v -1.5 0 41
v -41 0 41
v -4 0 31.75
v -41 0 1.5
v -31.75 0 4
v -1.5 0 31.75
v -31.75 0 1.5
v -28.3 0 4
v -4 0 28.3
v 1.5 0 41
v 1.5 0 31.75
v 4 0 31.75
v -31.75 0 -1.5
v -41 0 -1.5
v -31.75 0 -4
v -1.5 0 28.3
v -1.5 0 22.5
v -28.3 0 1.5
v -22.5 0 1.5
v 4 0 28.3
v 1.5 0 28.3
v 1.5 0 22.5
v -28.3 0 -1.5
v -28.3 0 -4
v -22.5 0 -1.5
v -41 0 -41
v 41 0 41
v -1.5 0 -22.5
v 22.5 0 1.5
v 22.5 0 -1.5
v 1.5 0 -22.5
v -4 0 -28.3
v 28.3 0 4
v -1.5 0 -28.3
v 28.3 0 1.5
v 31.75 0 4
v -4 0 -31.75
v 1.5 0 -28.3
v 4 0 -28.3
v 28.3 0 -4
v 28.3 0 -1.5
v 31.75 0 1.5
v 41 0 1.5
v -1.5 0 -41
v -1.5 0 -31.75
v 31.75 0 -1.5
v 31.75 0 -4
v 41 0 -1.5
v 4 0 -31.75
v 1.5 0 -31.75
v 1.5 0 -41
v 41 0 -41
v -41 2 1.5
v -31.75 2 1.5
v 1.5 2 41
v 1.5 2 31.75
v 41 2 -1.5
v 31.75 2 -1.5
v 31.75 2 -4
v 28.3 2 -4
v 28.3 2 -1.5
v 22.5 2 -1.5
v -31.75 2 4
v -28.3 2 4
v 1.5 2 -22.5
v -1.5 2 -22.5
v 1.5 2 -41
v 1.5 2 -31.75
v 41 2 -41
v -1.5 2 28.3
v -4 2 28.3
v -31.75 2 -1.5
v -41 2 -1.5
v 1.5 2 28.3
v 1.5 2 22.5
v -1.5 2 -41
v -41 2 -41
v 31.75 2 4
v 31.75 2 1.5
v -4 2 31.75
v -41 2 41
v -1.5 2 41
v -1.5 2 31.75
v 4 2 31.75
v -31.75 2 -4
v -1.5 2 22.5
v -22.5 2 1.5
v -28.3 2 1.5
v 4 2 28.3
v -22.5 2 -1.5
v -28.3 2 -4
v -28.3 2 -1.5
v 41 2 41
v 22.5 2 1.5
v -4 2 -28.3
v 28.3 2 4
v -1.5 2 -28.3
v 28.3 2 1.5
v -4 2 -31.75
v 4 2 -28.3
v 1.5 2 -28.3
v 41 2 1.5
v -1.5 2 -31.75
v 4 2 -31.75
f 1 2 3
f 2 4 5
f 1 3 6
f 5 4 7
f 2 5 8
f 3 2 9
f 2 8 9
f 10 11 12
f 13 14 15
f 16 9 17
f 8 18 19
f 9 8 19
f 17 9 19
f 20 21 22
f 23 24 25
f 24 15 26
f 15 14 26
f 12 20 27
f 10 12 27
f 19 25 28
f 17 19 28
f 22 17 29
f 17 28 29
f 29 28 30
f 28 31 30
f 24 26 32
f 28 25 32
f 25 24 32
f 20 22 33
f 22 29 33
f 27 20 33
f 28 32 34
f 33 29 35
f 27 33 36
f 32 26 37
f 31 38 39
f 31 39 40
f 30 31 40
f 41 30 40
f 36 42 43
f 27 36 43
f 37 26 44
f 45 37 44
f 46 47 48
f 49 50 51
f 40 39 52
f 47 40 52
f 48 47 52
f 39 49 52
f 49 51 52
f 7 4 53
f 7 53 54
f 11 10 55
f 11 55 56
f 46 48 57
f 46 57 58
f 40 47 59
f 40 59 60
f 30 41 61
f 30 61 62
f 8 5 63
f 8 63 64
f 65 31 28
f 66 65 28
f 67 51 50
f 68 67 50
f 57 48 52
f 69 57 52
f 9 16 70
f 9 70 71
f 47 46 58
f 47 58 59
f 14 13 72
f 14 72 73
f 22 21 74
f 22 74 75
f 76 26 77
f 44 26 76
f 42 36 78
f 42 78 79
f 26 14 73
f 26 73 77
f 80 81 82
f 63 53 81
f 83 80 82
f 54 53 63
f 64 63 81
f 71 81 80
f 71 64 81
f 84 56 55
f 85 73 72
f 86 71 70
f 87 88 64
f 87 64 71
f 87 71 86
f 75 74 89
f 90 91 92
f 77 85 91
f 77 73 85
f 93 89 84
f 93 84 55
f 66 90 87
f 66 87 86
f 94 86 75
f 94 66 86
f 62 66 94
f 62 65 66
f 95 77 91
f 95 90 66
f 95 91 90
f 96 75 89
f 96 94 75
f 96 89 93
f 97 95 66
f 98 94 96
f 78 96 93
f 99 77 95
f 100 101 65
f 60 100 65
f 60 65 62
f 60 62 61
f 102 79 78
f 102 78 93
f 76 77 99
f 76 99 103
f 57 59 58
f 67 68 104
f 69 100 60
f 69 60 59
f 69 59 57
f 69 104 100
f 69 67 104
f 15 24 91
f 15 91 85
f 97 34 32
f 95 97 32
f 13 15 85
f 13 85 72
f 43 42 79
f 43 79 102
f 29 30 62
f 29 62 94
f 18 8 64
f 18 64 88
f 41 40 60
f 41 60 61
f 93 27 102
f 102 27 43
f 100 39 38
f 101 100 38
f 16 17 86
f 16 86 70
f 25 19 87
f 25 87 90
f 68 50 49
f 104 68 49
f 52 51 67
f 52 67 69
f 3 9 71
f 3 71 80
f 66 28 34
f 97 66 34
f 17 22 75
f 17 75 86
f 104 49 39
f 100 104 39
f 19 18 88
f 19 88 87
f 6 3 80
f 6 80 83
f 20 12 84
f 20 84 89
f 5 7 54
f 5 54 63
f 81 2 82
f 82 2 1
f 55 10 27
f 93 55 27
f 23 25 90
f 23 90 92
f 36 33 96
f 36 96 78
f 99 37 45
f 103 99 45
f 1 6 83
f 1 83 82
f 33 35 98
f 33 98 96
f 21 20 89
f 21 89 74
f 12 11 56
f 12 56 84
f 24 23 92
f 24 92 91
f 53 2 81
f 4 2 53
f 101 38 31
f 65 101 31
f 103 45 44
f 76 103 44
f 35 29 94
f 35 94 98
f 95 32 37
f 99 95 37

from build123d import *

# Parameters (mm, degrees)
SKETCH1_W           = 82
SKETCH1_H           = 82
BOSS_EXTRUDE1_DEPTH = 2
CUT_EXTRUDE2_DEPTH  = 10


with BuildPart() as part:
    # Sketch1 → Boss-Extrude1 (new body)
    with BuildSketch(Plane(origin=(0, 0, 0), x_dir=(1, 0, 0), z_dir=(0, 1, 0))):
        Rectangle(SKETCH1_W, SKETCH1_H)
    extrude(amount=BOSS_EXTRUDE1_DEPTH)

    # Sketch2 → Cut-Extrude2 (cut)
    with BuildSketch(Plane(origin=(0, 0, 0), x_dir=(-1, 0, 0), z_dir=(0, -1, 0))):
        Polygon((-1.5, 22.5), (1.5, 22.5), (1.5, 28.3), (4, 28.3), (4, 31.75), (1.5, 31.75), (1.5, 41), (-1.5, 41), (-1.5, 31.75), (-4, 31.75), (-4, 28.3), (-1.5, 28.3), align=None)
        Polygon((28.3, -4), (28.3, -1.5), (22.5, -1.5), (22.5, 1.5), (28.3, 1.5), (28.3, 4), (31.75, 4), (31.75, 1.5), (41, 1.5), (41, -1.5), (31.75, -1.5), (31.75, -4), align=None)
        Polygon((-4, -28.3), (-1.5, -28.3), (-1.5, -22.5), (1.5, -22.5), (1.5, -28.3), (4, -28.3), (4, -31.75), (1.5, -31.75), (1.5, -41), (-1.5, -41), (-1.5, -31.75), (-4, -31.75), align=None)
        Polygon((-28.3, 4), (-28.3, 1.5), (-22.5, 1.5), (-22.5, -1.5), (-28.3, -1.5), (-28.3, -4), (-31.75, -4), (-31.75, -1.5), (-41, -1.5), (-41, 1.5), (-31.75, 1.5), (-31.75, 4), align=None)
    extrude(amount=-CUT_EXTRUDE2_DEPTH, mode=Mode.SUBTRACT)


solid = part.part
